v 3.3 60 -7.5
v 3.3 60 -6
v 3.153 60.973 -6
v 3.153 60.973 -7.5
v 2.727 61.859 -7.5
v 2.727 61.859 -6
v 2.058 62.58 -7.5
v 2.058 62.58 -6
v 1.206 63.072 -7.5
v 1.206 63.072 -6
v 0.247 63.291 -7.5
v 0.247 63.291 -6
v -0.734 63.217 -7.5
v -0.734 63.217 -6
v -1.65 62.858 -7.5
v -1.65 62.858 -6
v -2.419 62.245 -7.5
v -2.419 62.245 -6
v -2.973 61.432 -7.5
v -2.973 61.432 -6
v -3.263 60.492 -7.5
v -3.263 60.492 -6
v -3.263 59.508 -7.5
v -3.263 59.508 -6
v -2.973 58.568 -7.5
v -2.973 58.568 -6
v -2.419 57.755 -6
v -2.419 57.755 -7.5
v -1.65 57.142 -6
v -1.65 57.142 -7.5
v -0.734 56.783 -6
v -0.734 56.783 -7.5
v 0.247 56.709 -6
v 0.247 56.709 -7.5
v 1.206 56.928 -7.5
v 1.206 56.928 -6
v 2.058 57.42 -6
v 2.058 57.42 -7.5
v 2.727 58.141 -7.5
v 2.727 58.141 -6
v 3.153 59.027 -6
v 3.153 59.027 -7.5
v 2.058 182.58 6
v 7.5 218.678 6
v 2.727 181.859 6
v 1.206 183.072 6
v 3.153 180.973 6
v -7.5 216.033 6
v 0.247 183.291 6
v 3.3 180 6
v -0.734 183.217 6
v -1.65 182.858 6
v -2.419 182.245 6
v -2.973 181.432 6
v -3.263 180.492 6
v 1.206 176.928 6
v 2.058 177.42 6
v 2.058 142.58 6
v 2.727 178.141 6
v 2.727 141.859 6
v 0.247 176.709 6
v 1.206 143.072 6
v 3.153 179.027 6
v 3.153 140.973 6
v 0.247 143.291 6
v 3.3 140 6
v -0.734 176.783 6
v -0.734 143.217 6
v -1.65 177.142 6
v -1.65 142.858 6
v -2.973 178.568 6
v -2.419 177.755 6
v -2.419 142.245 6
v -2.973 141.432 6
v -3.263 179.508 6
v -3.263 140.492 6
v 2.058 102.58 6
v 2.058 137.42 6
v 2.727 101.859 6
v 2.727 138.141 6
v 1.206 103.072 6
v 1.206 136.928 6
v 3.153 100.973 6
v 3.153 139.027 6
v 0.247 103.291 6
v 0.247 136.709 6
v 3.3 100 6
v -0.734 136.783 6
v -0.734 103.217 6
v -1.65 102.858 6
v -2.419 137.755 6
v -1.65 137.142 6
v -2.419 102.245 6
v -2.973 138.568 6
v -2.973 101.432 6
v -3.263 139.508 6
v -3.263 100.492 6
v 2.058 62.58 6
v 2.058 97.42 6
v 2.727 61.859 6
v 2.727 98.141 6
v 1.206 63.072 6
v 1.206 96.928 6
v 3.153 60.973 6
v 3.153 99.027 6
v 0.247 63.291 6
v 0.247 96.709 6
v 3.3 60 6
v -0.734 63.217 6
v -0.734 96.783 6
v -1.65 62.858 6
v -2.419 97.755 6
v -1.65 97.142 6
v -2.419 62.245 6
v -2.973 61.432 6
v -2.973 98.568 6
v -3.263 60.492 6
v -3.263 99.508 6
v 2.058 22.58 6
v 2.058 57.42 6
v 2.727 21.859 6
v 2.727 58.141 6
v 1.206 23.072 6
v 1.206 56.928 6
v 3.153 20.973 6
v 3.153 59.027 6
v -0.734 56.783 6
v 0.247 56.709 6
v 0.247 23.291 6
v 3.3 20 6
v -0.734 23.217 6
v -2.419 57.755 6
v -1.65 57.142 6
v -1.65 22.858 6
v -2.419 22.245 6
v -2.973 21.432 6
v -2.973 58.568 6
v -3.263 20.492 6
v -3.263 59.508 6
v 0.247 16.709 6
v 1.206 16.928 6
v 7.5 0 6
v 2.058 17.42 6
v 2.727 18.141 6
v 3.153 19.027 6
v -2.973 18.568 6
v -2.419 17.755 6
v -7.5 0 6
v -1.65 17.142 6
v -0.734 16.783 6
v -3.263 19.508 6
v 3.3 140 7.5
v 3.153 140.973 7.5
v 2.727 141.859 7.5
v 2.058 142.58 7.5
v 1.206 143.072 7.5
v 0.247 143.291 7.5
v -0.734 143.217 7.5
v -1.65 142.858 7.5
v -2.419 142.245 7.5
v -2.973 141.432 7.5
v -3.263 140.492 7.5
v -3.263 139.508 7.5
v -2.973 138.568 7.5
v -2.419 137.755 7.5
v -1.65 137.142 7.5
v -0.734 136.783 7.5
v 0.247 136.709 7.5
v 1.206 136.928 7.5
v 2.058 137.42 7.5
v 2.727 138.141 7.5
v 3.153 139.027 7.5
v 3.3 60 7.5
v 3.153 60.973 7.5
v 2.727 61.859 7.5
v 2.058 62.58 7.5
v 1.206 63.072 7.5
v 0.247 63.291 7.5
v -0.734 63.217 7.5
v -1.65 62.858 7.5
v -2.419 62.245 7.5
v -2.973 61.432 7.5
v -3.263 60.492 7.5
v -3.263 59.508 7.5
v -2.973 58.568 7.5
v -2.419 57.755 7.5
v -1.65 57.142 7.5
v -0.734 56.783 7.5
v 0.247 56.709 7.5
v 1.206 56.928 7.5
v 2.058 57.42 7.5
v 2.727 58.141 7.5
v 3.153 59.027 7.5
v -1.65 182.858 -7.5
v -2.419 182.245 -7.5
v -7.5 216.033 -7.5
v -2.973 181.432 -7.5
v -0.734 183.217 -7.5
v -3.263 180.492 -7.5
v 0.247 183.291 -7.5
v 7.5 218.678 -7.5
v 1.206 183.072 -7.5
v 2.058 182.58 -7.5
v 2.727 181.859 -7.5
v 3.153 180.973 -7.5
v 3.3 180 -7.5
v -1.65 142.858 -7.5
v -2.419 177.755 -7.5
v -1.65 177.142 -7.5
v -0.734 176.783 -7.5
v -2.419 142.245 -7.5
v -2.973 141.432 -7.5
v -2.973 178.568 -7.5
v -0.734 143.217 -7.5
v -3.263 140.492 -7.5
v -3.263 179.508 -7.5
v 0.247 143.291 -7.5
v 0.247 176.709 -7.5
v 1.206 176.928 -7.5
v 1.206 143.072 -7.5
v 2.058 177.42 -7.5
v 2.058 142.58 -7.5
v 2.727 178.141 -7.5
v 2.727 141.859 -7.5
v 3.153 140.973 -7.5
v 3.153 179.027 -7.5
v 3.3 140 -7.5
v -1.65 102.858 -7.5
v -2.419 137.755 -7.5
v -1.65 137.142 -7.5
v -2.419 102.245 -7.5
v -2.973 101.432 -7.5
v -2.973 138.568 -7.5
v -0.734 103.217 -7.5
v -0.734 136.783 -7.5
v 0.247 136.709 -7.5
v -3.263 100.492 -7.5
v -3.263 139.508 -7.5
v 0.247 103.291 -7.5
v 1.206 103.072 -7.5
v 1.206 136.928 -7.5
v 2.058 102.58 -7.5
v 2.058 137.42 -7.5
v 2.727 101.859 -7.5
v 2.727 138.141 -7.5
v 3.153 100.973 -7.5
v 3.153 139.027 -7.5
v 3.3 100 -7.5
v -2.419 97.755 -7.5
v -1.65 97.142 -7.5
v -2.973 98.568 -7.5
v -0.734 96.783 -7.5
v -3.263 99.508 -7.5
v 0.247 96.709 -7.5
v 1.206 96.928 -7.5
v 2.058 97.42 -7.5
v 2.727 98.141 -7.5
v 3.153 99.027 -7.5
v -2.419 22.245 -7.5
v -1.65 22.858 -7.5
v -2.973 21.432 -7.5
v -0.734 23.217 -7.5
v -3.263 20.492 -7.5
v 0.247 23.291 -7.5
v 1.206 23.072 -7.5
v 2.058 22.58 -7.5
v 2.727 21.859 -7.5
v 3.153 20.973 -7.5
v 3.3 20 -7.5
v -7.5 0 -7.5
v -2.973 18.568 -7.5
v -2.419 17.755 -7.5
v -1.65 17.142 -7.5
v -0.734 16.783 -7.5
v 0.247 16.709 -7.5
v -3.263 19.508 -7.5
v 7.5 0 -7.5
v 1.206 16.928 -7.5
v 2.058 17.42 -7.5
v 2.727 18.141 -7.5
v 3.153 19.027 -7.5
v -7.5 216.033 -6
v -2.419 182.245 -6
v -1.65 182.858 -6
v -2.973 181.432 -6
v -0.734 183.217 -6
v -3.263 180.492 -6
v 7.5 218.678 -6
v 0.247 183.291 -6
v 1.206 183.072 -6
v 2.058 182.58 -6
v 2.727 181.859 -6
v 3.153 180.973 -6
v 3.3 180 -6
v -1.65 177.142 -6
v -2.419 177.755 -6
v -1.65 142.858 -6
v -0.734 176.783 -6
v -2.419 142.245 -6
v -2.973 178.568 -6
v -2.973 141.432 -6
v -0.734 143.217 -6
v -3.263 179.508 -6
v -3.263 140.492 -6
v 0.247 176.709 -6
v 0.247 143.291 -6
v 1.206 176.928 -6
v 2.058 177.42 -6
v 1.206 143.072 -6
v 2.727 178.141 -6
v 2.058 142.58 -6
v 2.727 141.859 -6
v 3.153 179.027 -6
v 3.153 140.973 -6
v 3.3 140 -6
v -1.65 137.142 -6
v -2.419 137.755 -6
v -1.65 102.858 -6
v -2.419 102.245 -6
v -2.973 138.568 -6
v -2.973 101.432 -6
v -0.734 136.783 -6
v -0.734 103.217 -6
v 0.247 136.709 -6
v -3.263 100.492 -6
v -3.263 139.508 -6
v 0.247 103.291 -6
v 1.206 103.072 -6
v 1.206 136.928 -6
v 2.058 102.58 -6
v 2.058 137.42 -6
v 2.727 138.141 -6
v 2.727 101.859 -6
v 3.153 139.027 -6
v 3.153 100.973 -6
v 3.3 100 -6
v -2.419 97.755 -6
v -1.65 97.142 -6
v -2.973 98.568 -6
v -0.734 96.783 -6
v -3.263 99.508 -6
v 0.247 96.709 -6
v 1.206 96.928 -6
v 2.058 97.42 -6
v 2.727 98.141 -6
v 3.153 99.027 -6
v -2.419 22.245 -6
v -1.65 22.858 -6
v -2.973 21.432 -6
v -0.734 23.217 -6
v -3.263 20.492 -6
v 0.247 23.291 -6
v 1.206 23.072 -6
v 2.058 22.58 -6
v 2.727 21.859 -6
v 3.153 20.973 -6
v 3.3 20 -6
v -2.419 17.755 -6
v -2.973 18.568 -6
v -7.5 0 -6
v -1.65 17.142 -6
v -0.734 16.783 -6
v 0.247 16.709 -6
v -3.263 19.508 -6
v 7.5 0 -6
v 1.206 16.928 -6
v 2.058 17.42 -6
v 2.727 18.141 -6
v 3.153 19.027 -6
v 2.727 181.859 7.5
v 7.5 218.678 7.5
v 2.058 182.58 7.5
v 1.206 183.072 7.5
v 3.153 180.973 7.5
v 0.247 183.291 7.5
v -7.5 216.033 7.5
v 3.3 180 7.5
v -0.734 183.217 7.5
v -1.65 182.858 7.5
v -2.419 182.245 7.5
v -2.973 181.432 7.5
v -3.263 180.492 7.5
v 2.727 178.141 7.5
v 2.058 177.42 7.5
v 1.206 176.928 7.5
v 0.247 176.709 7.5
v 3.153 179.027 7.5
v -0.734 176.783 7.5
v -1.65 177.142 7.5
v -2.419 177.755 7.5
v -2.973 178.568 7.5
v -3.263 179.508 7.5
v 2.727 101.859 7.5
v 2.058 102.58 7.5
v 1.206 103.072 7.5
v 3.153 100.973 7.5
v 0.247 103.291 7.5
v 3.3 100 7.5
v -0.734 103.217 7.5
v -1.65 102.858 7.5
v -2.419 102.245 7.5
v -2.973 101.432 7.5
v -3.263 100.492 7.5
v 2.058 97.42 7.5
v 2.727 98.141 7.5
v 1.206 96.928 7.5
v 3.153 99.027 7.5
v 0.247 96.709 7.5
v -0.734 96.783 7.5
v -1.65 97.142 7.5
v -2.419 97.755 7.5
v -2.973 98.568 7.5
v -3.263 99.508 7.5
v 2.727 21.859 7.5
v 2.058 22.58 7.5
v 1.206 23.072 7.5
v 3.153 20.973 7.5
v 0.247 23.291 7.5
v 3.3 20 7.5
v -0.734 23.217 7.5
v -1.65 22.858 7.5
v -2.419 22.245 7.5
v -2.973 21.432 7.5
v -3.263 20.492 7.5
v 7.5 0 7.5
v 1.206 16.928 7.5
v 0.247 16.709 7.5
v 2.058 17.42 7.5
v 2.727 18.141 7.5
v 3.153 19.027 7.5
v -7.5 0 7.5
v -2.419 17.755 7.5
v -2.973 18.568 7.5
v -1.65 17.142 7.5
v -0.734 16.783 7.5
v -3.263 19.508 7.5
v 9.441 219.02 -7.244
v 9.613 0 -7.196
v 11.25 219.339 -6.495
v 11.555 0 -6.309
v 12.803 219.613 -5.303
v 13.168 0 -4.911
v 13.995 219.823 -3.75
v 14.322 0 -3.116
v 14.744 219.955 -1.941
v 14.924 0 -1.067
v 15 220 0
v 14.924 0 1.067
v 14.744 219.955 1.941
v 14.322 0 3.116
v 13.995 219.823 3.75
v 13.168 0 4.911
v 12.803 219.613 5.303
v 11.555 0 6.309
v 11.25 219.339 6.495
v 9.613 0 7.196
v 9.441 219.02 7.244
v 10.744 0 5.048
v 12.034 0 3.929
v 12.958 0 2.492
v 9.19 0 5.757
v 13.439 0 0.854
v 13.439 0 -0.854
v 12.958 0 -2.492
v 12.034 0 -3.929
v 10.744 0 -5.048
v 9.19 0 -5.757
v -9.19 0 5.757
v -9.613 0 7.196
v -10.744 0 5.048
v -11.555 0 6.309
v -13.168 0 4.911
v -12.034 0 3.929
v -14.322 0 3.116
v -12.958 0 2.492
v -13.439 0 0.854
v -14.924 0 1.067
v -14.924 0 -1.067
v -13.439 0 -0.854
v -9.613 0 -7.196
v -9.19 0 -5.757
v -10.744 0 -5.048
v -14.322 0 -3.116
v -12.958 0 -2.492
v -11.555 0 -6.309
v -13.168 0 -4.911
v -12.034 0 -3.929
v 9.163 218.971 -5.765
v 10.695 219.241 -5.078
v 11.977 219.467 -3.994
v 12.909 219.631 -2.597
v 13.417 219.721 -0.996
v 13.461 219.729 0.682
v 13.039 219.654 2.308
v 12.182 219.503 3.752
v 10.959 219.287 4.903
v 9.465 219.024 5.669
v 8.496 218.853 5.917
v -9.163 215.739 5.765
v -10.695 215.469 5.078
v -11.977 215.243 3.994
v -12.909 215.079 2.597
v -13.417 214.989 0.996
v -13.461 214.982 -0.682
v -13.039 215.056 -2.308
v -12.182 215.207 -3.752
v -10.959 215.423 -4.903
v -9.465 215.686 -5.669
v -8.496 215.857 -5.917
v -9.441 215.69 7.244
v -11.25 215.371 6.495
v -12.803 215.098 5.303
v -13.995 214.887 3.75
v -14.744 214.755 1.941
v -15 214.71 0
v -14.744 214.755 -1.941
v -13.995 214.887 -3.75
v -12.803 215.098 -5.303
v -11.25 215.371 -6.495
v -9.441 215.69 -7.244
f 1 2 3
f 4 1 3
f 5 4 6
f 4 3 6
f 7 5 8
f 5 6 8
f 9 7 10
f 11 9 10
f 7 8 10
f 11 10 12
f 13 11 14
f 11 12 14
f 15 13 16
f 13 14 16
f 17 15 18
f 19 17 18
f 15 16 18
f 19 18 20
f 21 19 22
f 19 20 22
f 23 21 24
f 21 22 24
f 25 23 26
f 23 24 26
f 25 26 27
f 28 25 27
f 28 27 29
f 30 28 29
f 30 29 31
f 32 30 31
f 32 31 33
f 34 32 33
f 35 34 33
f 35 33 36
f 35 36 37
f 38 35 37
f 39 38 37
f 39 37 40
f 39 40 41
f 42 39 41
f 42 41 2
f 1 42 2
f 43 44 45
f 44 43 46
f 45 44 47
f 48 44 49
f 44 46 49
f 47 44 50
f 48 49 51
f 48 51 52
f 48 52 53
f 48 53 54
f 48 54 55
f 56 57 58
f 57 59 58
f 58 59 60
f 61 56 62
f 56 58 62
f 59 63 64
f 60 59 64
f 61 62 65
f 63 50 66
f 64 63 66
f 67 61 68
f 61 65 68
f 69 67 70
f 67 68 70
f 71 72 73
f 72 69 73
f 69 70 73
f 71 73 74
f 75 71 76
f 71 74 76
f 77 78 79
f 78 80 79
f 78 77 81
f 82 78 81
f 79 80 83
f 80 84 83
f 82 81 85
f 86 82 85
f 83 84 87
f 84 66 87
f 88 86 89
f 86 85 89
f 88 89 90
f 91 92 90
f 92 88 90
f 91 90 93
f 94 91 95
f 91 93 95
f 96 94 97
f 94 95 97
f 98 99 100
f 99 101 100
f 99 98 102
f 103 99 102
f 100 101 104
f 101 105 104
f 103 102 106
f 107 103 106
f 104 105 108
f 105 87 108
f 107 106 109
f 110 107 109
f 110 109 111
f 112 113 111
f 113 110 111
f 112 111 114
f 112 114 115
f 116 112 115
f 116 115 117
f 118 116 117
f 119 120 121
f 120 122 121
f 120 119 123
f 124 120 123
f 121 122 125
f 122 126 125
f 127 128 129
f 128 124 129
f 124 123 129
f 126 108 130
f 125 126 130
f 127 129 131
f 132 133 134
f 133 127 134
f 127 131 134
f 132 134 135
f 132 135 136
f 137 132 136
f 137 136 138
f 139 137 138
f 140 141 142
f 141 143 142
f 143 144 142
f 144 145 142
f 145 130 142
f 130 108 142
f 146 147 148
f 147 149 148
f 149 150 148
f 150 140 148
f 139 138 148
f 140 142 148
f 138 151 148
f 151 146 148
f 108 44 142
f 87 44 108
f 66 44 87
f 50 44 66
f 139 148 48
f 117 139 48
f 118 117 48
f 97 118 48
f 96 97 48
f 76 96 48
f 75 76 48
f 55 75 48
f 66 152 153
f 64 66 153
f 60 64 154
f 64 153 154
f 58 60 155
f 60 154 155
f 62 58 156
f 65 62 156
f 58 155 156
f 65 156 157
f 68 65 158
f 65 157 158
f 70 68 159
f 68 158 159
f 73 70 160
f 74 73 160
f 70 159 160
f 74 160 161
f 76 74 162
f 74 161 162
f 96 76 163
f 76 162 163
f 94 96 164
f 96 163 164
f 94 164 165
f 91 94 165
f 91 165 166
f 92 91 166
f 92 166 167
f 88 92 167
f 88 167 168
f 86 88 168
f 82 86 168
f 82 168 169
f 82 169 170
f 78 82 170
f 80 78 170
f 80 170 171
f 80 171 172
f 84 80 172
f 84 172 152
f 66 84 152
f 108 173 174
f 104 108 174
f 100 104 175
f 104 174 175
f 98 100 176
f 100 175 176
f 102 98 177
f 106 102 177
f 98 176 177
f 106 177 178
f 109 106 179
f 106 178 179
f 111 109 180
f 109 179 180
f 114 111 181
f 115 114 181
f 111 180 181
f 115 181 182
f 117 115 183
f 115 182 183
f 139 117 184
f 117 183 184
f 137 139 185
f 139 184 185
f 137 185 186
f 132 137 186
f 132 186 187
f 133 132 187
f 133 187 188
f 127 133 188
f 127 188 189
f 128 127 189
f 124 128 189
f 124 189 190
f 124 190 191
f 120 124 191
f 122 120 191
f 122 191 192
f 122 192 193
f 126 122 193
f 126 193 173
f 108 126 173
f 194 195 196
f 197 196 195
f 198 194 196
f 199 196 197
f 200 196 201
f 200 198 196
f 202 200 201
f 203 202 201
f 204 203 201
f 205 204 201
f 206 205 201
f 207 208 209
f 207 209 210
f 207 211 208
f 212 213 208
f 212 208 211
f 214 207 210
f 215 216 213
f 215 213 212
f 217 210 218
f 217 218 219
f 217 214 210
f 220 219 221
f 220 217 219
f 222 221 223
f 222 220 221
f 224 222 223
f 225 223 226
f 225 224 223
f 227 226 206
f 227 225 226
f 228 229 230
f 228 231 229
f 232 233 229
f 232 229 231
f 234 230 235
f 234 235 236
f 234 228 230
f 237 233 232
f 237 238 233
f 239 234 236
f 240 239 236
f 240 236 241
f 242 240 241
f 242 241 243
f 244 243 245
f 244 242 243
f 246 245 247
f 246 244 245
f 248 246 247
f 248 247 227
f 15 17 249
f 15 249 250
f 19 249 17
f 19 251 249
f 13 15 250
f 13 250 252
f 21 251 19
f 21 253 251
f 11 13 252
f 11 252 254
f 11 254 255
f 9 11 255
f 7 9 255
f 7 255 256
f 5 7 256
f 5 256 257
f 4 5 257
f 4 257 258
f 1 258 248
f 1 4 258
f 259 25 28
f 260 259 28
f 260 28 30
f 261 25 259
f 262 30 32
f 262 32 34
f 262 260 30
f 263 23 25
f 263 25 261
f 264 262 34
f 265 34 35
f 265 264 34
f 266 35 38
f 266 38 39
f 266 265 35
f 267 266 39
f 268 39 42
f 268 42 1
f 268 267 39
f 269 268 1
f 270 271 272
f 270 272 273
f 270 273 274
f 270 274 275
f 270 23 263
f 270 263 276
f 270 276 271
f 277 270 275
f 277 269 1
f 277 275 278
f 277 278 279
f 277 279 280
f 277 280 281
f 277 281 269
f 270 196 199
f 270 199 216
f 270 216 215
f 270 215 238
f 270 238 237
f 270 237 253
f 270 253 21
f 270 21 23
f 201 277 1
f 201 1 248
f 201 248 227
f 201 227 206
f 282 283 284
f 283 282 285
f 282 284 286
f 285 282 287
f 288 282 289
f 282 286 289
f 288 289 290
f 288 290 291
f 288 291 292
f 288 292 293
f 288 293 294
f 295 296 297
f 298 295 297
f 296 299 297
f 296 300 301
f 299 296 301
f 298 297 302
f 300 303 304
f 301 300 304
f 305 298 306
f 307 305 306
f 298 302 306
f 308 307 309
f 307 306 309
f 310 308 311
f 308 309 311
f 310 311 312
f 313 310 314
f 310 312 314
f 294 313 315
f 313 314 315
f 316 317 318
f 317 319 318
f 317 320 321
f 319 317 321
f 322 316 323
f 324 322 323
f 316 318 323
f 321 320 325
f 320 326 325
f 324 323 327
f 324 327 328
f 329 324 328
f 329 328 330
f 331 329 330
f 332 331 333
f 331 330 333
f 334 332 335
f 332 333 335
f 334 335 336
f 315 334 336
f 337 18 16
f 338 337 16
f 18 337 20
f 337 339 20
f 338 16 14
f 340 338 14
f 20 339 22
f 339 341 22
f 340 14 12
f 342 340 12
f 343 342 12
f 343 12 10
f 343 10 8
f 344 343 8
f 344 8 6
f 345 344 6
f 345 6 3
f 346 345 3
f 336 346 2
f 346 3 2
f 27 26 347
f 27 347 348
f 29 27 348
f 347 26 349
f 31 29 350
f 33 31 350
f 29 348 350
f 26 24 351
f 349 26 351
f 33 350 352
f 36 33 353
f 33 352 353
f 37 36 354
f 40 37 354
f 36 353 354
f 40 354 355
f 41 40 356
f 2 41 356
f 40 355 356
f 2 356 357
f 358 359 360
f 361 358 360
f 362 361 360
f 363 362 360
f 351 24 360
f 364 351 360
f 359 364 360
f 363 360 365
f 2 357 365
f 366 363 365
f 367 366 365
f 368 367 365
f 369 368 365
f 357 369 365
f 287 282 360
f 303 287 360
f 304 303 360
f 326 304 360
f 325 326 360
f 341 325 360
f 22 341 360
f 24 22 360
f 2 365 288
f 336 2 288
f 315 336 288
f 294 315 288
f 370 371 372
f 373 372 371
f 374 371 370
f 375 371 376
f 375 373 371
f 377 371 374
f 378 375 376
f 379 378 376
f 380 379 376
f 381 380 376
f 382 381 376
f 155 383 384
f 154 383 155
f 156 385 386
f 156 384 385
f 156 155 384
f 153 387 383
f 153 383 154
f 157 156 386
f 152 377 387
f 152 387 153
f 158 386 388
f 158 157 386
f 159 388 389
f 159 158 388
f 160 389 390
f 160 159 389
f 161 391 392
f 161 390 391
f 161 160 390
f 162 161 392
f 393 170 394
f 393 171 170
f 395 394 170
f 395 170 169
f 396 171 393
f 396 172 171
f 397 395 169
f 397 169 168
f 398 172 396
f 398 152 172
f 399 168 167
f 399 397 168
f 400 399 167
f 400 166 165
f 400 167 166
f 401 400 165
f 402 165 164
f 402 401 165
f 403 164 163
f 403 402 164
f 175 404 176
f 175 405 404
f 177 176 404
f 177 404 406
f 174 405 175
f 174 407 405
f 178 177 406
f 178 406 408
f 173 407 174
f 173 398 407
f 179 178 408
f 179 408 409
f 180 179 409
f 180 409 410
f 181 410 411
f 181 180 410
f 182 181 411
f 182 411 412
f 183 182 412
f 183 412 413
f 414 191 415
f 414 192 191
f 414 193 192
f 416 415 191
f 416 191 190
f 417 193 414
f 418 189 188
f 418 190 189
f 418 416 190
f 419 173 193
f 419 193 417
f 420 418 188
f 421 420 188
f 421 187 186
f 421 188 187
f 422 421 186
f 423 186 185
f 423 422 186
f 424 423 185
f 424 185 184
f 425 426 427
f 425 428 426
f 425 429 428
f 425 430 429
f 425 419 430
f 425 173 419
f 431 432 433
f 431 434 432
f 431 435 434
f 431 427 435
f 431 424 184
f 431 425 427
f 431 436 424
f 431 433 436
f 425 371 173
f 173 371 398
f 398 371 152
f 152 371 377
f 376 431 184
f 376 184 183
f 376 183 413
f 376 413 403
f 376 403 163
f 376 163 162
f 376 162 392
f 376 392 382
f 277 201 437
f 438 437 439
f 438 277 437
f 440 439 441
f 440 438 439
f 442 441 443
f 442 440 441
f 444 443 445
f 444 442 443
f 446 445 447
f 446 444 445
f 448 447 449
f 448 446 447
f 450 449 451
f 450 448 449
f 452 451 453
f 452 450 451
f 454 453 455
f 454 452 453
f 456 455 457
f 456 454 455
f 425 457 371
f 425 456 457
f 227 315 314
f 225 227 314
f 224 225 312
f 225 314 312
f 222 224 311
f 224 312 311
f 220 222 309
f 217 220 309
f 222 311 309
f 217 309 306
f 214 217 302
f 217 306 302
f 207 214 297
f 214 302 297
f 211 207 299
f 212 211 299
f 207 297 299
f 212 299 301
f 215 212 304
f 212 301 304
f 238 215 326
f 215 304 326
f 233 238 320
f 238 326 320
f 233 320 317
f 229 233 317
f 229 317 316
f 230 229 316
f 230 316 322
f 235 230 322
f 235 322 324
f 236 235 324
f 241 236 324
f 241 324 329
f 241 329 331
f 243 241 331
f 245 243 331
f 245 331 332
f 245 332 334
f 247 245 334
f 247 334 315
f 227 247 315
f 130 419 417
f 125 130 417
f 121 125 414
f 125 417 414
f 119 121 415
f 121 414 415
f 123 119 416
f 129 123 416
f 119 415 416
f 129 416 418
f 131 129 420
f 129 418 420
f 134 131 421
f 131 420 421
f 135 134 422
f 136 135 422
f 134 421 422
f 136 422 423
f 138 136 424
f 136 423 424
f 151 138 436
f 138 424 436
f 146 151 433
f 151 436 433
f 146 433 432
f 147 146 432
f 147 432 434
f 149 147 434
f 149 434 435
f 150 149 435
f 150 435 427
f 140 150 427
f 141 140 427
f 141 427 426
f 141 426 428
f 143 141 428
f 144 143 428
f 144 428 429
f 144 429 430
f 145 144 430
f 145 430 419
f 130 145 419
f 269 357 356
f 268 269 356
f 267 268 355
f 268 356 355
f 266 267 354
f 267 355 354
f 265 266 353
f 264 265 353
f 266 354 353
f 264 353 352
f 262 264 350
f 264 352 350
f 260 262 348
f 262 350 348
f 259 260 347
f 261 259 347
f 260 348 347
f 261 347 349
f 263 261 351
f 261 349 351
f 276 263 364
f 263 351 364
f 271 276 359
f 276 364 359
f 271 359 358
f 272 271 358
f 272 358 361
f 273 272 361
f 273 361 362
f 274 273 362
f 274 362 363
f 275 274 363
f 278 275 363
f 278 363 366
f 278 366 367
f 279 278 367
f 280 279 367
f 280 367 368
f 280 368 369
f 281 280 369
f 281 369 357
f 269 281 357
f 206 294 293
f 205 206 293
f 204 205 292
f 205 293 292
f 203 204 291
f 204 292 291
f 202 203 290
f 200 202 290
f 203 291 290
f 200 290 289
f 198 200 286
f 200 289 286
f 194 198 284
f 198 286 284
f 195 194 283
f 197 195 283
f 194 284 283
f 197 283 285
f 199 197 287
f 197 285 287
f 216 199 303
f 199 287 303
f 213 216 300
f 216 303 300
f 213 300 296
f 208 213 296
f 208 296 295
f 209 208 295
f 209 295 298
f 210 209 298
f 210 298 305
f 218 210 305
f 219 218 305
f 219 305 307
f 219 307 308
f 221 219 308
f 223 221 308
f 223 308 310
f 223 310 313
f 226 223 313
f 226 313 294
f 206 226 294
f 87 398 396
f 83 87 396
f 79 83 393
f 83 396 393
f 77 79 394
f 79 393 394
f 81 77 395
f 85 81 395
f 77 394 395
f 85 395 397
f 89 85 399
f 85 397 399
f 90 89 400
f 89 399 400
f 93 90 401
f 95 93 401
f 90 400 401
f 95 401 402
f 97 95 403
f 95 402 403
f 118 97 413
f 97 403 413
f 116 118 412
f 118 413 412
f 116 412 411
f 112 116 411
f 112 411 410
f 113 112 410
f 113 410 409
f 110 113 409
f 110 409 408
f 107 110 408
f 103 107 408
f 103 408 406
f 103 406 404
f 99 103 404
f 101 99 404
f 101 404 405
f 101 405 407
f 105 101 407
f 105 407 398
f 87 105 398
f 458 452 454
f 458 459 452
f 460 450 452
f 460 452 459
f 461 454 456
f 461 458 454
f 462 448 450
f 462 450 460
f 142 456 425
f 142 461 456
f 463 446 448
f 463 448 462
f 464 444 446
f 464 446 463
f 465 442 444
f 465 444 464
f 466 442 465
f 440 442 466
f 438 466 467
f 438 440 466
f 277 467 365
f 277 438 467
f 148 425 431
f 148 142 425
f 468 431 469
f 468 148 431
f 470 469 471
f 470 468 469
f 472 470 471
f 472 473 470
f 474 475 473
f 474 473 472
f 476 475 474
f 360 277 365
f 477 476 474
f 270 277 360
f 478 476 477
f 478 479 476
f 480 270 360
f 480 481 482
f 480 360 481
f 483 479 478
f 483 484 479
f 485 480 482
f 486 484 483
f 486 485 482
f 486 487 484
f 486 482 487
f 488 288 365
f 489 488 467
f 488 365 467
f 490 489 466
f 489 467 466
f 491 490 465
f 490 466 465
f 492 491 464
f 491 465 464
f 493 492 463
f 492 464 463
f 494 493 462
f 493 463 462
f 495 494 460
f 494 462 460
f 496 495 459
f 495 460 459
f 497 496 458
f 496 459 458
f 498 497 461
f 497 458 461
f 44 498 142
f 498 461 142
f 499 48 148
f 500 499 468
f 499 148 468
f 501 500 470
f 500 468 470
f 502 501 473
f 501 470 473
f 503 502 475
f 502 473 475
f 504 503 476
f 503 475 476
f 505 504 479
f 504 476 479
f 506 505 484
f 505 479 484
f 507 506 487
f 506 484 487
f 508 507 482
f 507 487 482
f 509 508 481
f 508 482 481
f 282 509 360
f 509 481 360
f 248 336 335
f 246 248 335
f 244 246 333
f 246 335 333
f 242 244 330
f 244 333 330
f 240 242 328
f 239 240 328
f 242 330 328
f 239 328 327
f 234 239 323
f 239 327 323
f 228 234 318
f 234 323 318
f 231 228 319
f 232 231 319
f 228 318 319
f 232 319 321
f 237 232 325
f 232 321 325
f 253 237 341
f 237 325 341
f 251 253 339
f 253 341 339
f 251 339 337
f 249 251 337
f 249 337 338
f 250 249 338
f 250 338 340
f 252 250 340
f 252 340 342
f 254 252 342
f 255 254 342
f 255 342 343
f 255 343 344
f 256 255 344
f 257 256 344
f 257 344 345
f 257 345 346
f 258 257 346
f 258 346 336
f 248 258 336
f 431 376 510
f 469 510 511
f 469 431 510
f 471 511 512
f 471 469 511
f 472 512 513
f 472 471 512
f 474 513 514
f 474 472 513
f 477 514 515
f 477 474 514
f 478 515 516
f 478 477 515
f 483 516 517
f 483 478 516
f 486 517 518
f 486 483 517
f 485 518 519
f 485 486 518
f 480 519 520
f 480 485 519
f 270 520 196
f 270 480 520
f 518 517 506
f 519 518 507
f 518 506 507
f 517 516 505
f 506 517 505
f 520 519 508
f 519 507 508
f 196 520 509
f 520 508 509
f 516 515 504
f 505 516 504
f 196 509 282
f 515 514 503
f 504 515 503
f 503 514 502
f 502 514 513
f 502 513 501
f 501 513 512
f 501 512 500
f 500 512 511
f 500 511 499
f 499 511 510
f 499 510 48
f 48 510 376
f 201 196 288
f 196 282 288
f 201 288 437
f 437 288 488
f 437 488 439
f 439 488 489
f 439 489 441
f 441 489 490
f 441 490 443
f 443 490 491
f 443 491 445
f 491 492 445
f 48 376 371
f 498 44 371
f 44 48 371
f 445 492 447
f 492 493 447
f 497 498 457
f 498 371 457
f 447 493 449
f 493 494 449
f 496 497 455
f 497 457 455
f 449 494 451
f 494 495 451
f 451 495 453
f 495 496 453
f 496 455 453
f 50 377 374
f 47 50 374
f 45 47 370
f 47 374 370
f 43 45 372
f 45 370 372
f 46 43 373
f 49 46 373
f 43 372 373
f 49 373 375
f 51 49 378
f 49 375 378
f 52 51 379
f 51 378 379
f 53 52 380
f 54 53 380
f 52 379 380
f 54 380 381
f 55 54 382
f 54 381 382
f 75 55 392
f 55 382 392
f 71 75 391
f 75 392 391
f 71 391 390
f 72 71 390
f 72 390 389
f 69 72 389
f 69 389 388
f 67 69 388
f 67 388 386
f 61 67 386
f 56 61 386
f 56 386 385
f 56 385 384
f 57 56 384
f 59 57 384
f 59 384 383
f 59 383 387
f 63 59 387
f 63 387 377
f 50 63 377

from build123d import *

# Parameters (mm, degrees)
EXTRUDE_1_DEPTH     = 220
SKETCH_2_R          = 3.3
CUT_EXTRUDE_1_DEPTH = 222.020361053


with BuildPart() as part:
    # Эскиз1 → Бобышка-Вытянуть1 (new body)
    with BuildSketch(Plane(origin=(0, 0, 0), x_dir=(1, 0, 0), z_dir=(0, 1, 0))):
        with BuildLine():
            Line((-7.5, 7.5), (7.5, 7.5))
            ThreePointArc((7.5, 7.5), (15, 0), (7.5, -7.5))
            Line((7.5, -7.5), (-7.5, -7.5))
            ThreePointArc((-7.5, -7.5), (-15, 0), (-7.5, 7.5))
        make_face()
        with BuildLine():
            Line((-7.5, 6), (7.5, 6))
            ThreePointArc((7.5, 6), (13.5, 0), (7.5, -6))
            Line((7.5, -6), (-7.5, -6))
            ThreePointArc((-7.5, -6), (-13.5, 0), (-7.5, 6))
        make_face(mode=Mode.SUBTRACT)
    extrude(amount=EXTRUDE_1_DEPTH)

    # Эскиз2 → Вырез-Вытянуть1 (cut, through all)
    with BuildSketch(Plane.XY.offset(7.5)):
        with Locations((0, 180)):
            Circle(SKETCH_2_R)
        with Locations((0, 140)):
            Circle(SKETCH_2_R)
        with Locations((0, 100)):
            Circle(SKETCH_2_R)
        with Locations((0, 60)):
            Circle(SKETCH_2_R)
        with Locations((0, 20)):
            Circle(SKETCH_2_R)
        Polygon((15, 220), (-15, 220), (-15, 214.710190579), align=None)
    extrude(amount=-CUT_EXTRUDE_1_DEPTH, mode=Mode.SUBTRACT)


solid = part.part
